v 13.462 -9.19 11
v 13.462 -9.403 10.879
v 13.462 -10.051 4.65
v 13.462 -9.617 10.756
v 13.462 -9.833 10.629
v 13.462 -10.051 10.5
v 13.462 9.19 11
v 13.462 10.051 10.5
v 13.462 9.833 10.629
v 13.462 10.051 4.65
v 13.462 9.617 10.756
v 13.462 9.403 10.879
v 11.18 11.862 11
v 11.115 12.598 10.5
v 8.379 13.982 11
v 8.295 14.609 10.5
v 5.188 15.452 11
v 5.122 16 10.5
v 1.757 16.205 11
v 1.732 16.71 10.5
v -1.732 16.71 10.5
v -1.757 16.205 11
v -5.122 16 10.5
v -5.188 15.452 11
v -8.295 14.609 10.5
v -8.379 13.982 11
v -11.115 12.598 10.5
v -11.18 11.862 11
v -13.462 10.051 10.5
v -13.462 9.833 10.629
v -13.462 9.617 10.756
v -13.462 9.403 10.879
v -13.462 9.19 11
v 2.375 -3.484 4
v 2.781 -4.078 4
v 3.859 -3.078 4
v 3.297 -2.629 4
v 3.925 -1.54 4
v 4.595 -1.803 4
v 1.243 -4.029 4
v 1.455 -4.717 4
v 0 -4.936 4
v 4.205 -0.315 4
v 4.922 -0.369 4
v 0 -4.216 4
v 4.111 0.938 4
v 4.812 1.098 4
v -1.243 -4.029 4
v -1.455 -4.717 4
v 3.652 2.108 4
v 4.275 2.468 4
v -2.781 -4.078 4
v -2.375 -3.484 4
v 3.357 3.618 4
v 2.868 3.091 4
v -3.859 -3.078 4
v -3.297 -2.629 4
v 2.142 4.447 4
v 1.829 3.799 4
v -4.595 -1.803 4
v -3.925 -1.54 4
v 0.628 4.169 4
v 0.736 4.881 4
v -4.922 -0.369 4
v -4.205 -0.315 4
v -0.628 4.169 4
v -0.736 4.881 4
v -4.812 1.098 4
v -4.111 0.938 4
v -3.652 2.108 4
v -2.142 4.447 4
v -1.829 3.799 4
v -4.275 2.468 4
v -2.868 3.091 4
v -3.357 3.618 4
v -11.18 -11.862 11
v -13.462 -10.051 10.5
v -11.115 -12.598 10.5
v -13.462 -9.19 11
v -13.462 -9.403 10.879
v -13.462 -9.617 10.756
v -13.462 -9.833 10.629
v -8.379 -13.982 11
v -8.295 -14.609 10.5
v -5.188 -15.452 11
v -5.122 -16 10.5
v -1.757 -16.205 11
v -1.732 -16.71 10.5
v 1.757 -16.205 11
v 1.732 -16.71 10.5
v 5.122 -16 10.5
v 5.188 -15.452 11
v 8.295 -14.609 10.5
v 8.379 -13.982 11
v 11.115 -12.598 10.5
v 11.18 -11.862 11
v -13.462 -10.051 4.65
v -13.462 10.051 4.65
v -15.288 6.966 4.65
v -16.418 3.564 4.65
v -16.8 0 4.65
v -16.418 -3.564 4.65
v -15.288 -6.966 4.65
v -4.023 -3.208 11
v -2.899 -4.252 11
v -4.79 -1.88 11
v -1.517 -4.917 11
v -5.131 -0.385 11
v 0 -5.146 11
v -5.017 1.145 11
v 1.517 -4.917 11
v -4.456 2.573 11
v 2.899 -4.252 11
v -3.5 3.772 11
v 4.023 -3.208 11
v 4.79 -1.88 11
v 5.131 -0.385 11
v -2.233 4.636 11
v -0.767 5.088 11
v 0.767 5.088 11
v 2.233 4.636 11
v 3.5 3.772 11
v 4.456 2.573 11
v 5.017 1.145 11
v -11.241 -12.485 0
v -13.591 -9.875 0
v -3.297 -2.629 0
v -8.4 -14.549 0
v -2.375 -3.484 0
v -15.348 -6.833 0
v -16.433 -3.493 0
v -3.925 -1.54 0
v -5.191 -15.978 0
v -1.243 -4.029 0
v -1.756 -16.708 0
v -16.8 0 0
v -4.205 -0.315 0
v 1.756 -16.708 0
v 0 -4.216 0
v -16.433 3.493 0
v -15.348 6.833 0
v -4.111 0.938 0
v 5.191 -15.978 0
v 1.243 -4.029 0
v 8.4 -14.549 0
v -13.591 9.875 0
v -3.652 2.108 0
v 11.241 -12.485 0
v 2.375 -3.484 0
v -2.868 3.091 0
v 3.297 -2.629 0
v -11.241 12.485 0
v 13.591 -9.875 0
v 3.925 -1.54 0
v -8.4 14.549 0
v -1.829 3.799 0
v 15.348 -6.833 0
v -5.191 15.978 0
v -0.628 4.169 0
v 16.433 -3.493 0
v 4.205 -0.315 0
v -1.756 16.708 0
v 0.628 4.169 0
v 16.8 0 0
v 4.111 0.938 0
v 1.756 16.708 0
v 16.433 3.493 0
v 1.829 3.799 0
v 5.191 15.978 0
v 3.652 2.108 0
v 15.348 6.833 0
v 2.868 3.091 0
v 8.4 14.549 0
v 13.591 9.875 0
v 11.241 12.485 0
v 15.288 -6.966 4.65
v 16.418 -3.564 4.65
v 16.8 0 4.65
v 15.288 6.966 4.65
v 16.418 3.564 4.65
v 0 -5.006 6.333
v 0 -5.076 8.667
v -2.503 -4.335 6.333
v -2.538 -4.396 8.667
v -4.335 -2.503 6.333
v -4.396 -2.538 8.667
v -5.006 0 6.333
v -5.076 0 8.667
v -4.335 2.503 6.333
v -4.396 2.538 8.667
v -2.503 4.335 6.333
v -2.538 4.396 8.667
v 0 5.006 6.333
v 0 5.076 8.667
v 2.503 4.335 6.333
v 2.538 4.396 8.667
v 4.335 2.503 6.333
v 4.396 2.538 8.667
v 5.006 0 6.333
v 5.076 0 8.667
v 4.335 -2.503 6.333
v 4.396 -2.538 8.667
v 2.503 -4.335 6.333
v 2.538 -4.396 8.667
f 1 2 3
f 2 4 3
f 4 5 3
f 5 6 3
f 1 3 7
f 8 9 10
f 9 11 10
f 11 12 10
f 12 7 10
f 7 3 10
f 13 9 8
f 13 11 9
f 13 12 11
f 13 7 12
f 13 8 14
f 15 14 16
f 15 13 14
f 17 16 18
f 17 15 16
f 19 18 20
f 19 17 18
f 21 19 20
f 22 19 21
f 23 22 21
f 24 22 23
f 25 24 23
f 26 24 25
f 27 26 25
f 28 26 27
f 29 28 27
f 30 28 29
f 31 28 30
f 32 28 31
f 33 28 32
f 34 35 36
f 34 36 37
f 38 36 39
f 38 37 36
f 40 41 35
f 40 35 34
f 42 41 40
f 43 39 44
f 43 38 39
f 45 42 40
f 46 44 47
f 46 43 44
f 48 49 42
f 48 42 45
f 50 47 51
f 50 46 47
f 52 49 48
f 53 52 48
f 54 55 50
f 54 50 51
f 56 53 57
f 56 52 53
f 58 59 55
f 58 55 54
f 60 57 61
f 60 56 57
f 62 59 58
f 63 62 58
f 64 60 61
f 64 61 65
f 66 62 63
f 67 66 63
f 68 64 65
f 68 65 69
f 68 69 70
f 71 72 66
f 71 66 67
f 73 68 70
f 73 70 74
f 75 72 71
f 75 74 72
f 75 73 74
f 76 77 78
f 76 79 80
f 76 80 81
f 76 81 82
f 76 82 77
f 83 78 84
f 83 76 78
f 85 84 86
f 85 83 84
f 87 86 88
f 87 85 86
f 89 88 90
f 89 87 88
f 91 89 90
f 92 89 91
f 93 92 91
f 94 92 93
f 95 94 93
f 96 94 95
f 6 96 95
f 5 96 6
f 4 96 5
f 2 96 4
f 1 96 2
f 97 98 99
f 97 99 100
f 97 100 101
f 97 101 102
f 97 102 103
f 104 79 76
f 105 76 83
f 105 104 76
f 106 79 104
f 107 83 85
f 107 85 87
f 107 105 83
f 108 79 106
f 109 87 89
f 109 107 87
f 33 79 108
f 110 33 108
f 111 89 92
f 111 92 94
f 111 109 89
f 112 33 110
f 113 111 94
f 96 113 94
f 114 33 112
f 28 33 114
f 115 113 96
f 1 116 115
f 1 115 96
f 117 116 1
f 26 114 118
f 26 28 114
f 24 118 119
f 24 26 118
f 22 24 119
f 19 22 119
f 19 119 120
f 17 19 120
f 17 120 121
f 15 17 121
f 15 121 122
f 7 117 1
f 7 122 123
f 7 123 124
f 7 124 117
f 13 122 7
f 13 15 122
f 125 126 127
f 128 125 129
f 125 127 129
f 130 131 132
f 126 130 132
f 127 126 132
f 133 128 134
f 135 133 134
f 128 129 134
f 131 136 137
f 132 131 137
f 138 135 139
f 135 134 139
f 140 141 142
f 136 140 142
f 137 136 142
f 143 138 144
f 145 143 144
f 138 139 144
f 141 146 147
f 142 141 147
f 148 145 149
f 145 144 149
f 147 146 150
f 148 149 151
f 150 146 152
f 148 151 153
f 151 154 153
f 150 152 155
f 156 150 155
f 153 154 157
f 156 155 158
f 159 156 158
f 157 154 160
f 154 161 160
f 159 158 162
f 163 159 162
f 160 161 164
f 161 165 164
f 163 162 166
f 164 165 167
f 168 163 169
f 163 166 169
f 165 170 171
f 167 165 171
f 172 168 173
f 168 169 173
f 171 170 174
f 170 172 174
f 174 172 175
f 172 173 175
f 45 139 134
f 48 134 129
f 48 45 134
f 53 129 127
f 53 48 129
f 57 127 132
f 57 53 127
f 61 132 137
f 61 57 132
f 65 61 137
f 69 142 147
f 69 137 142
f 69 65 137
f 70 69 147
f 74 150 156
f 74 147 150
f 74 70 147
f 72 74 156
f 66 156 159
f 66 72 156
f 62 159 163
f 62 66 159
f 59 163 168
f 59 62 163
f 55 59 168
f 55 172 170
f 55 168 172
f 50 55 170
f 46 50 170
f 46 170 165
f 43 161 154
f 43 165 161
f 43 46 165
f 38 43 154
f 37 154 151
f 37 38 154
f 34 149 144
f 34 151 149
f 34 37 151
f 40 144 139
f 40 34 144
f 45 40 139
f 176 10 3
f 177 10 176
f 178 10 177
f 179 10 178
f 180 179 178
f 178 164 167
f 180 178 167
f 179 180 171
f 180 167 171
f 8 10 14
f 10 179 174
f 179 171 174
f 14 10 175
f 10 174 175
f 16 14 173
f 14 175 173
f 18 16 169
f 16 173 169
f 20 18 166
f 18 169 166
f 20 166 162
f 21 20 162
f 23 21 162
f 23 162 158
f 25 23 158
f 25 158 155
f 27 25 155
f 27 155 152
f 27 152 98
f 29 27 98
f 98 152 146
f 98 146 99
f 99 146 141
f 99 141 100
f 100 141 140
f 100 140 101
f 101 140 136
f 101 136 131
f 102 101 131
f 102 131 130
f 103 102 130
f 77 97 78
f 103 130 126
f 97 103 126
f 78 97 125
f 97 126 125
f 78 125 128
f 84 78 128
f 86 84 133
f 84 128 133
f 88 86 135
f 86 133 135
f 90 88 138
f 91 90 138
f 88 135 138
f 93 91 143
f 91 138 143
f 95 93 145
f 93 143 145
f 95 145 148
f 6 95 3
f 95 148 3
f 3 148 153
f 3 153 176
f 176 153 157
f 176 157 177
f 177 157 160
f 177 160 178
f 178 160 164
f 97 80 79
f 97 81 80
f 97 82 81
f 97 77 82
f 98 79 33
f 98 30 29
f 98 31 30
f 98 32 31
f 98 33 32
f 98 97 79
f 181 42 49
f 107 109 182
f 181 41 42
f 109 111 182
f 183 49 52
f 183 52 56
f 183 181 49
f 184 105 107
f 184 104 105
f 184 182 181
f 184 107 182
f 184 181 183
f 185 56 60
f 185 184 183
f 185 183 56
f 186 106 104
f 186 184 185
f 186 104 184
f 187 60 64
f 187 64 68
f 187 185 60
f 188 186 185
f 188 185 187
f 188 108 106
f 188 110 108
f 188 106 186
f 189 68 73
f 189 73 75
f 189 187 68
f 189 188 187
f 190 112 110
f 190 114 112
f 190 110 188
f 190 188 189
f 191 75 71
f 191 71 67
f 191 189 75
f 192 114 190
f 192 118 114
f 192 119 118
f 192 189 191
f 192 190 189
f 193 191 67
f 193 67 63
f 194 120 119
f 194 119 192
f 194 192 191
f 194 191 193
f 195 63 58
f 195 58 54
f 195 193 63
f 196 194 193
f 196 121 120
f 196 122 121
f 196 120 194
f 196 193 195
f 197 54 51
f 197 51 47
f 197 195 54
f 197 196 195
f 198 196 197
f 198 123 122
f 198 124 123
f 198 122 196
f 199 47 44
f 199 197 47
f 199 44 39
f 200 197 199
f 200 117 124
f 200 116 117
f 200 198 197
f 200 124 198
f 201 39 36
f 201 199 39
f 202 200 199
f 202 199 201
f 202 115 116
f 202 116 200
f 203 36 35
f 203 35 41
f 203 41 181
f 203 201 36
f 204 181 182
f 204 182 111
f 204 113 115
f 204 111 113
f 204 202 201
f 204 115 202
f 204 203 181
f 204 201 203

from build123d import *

# Parameters (mm, degrees)
SKETCH1_R        = 16.8
BODY_DEPTH       = 11
BODYCHAMFER_SIZE = 0.5
BODYFLAT_START   = -6.35
BODYFLAT_DEPTH   = 6.35


with BuildPart() as part:
    # Sketch1 → Body (new body)
    with BuildSketch(Plane.XY):
        Circle(SKETCH1_R)
    extrude(amount=BODY_DEPTH)

    # BodyChamfer
    bodychamfer_edges = [part.edges().sort_by_distance(p)[0] for p in [
        (-16.8, 0, 11),
    ]]
    chamfer(bodychamfer_edges, length=BODYCHAMFER_SIZE)

    # Sketch2 → BodyFlat (cut)
    with BuildSketch(Plane.XY.offset(11).offset(BODYFLAT_START)):
        with BuildLine():
            Line((-13.462, -10.050599783), (-13.462, 10.050599783))
            ThreePointArc((-13.462, 10.050599783), (-16.8, 0), (-13.462, -10.050599783))
        make_face()
        with BuildLine():
            Line((13.462, -10.050599783), (13.462, 10.050599783))
            ThreePointArc((13.462, 10.050599783), (16.8, 0), (13.462, -10.050599783))
        make_face()
    extrude(amount=BODYFLAT_DEPTH, mode=Mode.SUBTRACT)

    # Sketch4 → 1/8 NPT Tapped Hole1 (revolve, cut)
    with BuildSketch(Plane(origin=(0, 0, 11), x_dir=(0, -1, 0), z_dir=(1, 0, 0))):
        Polygon((0, 0), (0, 14.533468714), (4.2164, 12), (4.2164, 7), (4.936183926, 7), (5.1457733, 0), align=None)
    revolve(axis=Axis((0, 0, 17.35), (0, 0, -1)), mode=Mode.SUBTRACT)


solid = part.part
